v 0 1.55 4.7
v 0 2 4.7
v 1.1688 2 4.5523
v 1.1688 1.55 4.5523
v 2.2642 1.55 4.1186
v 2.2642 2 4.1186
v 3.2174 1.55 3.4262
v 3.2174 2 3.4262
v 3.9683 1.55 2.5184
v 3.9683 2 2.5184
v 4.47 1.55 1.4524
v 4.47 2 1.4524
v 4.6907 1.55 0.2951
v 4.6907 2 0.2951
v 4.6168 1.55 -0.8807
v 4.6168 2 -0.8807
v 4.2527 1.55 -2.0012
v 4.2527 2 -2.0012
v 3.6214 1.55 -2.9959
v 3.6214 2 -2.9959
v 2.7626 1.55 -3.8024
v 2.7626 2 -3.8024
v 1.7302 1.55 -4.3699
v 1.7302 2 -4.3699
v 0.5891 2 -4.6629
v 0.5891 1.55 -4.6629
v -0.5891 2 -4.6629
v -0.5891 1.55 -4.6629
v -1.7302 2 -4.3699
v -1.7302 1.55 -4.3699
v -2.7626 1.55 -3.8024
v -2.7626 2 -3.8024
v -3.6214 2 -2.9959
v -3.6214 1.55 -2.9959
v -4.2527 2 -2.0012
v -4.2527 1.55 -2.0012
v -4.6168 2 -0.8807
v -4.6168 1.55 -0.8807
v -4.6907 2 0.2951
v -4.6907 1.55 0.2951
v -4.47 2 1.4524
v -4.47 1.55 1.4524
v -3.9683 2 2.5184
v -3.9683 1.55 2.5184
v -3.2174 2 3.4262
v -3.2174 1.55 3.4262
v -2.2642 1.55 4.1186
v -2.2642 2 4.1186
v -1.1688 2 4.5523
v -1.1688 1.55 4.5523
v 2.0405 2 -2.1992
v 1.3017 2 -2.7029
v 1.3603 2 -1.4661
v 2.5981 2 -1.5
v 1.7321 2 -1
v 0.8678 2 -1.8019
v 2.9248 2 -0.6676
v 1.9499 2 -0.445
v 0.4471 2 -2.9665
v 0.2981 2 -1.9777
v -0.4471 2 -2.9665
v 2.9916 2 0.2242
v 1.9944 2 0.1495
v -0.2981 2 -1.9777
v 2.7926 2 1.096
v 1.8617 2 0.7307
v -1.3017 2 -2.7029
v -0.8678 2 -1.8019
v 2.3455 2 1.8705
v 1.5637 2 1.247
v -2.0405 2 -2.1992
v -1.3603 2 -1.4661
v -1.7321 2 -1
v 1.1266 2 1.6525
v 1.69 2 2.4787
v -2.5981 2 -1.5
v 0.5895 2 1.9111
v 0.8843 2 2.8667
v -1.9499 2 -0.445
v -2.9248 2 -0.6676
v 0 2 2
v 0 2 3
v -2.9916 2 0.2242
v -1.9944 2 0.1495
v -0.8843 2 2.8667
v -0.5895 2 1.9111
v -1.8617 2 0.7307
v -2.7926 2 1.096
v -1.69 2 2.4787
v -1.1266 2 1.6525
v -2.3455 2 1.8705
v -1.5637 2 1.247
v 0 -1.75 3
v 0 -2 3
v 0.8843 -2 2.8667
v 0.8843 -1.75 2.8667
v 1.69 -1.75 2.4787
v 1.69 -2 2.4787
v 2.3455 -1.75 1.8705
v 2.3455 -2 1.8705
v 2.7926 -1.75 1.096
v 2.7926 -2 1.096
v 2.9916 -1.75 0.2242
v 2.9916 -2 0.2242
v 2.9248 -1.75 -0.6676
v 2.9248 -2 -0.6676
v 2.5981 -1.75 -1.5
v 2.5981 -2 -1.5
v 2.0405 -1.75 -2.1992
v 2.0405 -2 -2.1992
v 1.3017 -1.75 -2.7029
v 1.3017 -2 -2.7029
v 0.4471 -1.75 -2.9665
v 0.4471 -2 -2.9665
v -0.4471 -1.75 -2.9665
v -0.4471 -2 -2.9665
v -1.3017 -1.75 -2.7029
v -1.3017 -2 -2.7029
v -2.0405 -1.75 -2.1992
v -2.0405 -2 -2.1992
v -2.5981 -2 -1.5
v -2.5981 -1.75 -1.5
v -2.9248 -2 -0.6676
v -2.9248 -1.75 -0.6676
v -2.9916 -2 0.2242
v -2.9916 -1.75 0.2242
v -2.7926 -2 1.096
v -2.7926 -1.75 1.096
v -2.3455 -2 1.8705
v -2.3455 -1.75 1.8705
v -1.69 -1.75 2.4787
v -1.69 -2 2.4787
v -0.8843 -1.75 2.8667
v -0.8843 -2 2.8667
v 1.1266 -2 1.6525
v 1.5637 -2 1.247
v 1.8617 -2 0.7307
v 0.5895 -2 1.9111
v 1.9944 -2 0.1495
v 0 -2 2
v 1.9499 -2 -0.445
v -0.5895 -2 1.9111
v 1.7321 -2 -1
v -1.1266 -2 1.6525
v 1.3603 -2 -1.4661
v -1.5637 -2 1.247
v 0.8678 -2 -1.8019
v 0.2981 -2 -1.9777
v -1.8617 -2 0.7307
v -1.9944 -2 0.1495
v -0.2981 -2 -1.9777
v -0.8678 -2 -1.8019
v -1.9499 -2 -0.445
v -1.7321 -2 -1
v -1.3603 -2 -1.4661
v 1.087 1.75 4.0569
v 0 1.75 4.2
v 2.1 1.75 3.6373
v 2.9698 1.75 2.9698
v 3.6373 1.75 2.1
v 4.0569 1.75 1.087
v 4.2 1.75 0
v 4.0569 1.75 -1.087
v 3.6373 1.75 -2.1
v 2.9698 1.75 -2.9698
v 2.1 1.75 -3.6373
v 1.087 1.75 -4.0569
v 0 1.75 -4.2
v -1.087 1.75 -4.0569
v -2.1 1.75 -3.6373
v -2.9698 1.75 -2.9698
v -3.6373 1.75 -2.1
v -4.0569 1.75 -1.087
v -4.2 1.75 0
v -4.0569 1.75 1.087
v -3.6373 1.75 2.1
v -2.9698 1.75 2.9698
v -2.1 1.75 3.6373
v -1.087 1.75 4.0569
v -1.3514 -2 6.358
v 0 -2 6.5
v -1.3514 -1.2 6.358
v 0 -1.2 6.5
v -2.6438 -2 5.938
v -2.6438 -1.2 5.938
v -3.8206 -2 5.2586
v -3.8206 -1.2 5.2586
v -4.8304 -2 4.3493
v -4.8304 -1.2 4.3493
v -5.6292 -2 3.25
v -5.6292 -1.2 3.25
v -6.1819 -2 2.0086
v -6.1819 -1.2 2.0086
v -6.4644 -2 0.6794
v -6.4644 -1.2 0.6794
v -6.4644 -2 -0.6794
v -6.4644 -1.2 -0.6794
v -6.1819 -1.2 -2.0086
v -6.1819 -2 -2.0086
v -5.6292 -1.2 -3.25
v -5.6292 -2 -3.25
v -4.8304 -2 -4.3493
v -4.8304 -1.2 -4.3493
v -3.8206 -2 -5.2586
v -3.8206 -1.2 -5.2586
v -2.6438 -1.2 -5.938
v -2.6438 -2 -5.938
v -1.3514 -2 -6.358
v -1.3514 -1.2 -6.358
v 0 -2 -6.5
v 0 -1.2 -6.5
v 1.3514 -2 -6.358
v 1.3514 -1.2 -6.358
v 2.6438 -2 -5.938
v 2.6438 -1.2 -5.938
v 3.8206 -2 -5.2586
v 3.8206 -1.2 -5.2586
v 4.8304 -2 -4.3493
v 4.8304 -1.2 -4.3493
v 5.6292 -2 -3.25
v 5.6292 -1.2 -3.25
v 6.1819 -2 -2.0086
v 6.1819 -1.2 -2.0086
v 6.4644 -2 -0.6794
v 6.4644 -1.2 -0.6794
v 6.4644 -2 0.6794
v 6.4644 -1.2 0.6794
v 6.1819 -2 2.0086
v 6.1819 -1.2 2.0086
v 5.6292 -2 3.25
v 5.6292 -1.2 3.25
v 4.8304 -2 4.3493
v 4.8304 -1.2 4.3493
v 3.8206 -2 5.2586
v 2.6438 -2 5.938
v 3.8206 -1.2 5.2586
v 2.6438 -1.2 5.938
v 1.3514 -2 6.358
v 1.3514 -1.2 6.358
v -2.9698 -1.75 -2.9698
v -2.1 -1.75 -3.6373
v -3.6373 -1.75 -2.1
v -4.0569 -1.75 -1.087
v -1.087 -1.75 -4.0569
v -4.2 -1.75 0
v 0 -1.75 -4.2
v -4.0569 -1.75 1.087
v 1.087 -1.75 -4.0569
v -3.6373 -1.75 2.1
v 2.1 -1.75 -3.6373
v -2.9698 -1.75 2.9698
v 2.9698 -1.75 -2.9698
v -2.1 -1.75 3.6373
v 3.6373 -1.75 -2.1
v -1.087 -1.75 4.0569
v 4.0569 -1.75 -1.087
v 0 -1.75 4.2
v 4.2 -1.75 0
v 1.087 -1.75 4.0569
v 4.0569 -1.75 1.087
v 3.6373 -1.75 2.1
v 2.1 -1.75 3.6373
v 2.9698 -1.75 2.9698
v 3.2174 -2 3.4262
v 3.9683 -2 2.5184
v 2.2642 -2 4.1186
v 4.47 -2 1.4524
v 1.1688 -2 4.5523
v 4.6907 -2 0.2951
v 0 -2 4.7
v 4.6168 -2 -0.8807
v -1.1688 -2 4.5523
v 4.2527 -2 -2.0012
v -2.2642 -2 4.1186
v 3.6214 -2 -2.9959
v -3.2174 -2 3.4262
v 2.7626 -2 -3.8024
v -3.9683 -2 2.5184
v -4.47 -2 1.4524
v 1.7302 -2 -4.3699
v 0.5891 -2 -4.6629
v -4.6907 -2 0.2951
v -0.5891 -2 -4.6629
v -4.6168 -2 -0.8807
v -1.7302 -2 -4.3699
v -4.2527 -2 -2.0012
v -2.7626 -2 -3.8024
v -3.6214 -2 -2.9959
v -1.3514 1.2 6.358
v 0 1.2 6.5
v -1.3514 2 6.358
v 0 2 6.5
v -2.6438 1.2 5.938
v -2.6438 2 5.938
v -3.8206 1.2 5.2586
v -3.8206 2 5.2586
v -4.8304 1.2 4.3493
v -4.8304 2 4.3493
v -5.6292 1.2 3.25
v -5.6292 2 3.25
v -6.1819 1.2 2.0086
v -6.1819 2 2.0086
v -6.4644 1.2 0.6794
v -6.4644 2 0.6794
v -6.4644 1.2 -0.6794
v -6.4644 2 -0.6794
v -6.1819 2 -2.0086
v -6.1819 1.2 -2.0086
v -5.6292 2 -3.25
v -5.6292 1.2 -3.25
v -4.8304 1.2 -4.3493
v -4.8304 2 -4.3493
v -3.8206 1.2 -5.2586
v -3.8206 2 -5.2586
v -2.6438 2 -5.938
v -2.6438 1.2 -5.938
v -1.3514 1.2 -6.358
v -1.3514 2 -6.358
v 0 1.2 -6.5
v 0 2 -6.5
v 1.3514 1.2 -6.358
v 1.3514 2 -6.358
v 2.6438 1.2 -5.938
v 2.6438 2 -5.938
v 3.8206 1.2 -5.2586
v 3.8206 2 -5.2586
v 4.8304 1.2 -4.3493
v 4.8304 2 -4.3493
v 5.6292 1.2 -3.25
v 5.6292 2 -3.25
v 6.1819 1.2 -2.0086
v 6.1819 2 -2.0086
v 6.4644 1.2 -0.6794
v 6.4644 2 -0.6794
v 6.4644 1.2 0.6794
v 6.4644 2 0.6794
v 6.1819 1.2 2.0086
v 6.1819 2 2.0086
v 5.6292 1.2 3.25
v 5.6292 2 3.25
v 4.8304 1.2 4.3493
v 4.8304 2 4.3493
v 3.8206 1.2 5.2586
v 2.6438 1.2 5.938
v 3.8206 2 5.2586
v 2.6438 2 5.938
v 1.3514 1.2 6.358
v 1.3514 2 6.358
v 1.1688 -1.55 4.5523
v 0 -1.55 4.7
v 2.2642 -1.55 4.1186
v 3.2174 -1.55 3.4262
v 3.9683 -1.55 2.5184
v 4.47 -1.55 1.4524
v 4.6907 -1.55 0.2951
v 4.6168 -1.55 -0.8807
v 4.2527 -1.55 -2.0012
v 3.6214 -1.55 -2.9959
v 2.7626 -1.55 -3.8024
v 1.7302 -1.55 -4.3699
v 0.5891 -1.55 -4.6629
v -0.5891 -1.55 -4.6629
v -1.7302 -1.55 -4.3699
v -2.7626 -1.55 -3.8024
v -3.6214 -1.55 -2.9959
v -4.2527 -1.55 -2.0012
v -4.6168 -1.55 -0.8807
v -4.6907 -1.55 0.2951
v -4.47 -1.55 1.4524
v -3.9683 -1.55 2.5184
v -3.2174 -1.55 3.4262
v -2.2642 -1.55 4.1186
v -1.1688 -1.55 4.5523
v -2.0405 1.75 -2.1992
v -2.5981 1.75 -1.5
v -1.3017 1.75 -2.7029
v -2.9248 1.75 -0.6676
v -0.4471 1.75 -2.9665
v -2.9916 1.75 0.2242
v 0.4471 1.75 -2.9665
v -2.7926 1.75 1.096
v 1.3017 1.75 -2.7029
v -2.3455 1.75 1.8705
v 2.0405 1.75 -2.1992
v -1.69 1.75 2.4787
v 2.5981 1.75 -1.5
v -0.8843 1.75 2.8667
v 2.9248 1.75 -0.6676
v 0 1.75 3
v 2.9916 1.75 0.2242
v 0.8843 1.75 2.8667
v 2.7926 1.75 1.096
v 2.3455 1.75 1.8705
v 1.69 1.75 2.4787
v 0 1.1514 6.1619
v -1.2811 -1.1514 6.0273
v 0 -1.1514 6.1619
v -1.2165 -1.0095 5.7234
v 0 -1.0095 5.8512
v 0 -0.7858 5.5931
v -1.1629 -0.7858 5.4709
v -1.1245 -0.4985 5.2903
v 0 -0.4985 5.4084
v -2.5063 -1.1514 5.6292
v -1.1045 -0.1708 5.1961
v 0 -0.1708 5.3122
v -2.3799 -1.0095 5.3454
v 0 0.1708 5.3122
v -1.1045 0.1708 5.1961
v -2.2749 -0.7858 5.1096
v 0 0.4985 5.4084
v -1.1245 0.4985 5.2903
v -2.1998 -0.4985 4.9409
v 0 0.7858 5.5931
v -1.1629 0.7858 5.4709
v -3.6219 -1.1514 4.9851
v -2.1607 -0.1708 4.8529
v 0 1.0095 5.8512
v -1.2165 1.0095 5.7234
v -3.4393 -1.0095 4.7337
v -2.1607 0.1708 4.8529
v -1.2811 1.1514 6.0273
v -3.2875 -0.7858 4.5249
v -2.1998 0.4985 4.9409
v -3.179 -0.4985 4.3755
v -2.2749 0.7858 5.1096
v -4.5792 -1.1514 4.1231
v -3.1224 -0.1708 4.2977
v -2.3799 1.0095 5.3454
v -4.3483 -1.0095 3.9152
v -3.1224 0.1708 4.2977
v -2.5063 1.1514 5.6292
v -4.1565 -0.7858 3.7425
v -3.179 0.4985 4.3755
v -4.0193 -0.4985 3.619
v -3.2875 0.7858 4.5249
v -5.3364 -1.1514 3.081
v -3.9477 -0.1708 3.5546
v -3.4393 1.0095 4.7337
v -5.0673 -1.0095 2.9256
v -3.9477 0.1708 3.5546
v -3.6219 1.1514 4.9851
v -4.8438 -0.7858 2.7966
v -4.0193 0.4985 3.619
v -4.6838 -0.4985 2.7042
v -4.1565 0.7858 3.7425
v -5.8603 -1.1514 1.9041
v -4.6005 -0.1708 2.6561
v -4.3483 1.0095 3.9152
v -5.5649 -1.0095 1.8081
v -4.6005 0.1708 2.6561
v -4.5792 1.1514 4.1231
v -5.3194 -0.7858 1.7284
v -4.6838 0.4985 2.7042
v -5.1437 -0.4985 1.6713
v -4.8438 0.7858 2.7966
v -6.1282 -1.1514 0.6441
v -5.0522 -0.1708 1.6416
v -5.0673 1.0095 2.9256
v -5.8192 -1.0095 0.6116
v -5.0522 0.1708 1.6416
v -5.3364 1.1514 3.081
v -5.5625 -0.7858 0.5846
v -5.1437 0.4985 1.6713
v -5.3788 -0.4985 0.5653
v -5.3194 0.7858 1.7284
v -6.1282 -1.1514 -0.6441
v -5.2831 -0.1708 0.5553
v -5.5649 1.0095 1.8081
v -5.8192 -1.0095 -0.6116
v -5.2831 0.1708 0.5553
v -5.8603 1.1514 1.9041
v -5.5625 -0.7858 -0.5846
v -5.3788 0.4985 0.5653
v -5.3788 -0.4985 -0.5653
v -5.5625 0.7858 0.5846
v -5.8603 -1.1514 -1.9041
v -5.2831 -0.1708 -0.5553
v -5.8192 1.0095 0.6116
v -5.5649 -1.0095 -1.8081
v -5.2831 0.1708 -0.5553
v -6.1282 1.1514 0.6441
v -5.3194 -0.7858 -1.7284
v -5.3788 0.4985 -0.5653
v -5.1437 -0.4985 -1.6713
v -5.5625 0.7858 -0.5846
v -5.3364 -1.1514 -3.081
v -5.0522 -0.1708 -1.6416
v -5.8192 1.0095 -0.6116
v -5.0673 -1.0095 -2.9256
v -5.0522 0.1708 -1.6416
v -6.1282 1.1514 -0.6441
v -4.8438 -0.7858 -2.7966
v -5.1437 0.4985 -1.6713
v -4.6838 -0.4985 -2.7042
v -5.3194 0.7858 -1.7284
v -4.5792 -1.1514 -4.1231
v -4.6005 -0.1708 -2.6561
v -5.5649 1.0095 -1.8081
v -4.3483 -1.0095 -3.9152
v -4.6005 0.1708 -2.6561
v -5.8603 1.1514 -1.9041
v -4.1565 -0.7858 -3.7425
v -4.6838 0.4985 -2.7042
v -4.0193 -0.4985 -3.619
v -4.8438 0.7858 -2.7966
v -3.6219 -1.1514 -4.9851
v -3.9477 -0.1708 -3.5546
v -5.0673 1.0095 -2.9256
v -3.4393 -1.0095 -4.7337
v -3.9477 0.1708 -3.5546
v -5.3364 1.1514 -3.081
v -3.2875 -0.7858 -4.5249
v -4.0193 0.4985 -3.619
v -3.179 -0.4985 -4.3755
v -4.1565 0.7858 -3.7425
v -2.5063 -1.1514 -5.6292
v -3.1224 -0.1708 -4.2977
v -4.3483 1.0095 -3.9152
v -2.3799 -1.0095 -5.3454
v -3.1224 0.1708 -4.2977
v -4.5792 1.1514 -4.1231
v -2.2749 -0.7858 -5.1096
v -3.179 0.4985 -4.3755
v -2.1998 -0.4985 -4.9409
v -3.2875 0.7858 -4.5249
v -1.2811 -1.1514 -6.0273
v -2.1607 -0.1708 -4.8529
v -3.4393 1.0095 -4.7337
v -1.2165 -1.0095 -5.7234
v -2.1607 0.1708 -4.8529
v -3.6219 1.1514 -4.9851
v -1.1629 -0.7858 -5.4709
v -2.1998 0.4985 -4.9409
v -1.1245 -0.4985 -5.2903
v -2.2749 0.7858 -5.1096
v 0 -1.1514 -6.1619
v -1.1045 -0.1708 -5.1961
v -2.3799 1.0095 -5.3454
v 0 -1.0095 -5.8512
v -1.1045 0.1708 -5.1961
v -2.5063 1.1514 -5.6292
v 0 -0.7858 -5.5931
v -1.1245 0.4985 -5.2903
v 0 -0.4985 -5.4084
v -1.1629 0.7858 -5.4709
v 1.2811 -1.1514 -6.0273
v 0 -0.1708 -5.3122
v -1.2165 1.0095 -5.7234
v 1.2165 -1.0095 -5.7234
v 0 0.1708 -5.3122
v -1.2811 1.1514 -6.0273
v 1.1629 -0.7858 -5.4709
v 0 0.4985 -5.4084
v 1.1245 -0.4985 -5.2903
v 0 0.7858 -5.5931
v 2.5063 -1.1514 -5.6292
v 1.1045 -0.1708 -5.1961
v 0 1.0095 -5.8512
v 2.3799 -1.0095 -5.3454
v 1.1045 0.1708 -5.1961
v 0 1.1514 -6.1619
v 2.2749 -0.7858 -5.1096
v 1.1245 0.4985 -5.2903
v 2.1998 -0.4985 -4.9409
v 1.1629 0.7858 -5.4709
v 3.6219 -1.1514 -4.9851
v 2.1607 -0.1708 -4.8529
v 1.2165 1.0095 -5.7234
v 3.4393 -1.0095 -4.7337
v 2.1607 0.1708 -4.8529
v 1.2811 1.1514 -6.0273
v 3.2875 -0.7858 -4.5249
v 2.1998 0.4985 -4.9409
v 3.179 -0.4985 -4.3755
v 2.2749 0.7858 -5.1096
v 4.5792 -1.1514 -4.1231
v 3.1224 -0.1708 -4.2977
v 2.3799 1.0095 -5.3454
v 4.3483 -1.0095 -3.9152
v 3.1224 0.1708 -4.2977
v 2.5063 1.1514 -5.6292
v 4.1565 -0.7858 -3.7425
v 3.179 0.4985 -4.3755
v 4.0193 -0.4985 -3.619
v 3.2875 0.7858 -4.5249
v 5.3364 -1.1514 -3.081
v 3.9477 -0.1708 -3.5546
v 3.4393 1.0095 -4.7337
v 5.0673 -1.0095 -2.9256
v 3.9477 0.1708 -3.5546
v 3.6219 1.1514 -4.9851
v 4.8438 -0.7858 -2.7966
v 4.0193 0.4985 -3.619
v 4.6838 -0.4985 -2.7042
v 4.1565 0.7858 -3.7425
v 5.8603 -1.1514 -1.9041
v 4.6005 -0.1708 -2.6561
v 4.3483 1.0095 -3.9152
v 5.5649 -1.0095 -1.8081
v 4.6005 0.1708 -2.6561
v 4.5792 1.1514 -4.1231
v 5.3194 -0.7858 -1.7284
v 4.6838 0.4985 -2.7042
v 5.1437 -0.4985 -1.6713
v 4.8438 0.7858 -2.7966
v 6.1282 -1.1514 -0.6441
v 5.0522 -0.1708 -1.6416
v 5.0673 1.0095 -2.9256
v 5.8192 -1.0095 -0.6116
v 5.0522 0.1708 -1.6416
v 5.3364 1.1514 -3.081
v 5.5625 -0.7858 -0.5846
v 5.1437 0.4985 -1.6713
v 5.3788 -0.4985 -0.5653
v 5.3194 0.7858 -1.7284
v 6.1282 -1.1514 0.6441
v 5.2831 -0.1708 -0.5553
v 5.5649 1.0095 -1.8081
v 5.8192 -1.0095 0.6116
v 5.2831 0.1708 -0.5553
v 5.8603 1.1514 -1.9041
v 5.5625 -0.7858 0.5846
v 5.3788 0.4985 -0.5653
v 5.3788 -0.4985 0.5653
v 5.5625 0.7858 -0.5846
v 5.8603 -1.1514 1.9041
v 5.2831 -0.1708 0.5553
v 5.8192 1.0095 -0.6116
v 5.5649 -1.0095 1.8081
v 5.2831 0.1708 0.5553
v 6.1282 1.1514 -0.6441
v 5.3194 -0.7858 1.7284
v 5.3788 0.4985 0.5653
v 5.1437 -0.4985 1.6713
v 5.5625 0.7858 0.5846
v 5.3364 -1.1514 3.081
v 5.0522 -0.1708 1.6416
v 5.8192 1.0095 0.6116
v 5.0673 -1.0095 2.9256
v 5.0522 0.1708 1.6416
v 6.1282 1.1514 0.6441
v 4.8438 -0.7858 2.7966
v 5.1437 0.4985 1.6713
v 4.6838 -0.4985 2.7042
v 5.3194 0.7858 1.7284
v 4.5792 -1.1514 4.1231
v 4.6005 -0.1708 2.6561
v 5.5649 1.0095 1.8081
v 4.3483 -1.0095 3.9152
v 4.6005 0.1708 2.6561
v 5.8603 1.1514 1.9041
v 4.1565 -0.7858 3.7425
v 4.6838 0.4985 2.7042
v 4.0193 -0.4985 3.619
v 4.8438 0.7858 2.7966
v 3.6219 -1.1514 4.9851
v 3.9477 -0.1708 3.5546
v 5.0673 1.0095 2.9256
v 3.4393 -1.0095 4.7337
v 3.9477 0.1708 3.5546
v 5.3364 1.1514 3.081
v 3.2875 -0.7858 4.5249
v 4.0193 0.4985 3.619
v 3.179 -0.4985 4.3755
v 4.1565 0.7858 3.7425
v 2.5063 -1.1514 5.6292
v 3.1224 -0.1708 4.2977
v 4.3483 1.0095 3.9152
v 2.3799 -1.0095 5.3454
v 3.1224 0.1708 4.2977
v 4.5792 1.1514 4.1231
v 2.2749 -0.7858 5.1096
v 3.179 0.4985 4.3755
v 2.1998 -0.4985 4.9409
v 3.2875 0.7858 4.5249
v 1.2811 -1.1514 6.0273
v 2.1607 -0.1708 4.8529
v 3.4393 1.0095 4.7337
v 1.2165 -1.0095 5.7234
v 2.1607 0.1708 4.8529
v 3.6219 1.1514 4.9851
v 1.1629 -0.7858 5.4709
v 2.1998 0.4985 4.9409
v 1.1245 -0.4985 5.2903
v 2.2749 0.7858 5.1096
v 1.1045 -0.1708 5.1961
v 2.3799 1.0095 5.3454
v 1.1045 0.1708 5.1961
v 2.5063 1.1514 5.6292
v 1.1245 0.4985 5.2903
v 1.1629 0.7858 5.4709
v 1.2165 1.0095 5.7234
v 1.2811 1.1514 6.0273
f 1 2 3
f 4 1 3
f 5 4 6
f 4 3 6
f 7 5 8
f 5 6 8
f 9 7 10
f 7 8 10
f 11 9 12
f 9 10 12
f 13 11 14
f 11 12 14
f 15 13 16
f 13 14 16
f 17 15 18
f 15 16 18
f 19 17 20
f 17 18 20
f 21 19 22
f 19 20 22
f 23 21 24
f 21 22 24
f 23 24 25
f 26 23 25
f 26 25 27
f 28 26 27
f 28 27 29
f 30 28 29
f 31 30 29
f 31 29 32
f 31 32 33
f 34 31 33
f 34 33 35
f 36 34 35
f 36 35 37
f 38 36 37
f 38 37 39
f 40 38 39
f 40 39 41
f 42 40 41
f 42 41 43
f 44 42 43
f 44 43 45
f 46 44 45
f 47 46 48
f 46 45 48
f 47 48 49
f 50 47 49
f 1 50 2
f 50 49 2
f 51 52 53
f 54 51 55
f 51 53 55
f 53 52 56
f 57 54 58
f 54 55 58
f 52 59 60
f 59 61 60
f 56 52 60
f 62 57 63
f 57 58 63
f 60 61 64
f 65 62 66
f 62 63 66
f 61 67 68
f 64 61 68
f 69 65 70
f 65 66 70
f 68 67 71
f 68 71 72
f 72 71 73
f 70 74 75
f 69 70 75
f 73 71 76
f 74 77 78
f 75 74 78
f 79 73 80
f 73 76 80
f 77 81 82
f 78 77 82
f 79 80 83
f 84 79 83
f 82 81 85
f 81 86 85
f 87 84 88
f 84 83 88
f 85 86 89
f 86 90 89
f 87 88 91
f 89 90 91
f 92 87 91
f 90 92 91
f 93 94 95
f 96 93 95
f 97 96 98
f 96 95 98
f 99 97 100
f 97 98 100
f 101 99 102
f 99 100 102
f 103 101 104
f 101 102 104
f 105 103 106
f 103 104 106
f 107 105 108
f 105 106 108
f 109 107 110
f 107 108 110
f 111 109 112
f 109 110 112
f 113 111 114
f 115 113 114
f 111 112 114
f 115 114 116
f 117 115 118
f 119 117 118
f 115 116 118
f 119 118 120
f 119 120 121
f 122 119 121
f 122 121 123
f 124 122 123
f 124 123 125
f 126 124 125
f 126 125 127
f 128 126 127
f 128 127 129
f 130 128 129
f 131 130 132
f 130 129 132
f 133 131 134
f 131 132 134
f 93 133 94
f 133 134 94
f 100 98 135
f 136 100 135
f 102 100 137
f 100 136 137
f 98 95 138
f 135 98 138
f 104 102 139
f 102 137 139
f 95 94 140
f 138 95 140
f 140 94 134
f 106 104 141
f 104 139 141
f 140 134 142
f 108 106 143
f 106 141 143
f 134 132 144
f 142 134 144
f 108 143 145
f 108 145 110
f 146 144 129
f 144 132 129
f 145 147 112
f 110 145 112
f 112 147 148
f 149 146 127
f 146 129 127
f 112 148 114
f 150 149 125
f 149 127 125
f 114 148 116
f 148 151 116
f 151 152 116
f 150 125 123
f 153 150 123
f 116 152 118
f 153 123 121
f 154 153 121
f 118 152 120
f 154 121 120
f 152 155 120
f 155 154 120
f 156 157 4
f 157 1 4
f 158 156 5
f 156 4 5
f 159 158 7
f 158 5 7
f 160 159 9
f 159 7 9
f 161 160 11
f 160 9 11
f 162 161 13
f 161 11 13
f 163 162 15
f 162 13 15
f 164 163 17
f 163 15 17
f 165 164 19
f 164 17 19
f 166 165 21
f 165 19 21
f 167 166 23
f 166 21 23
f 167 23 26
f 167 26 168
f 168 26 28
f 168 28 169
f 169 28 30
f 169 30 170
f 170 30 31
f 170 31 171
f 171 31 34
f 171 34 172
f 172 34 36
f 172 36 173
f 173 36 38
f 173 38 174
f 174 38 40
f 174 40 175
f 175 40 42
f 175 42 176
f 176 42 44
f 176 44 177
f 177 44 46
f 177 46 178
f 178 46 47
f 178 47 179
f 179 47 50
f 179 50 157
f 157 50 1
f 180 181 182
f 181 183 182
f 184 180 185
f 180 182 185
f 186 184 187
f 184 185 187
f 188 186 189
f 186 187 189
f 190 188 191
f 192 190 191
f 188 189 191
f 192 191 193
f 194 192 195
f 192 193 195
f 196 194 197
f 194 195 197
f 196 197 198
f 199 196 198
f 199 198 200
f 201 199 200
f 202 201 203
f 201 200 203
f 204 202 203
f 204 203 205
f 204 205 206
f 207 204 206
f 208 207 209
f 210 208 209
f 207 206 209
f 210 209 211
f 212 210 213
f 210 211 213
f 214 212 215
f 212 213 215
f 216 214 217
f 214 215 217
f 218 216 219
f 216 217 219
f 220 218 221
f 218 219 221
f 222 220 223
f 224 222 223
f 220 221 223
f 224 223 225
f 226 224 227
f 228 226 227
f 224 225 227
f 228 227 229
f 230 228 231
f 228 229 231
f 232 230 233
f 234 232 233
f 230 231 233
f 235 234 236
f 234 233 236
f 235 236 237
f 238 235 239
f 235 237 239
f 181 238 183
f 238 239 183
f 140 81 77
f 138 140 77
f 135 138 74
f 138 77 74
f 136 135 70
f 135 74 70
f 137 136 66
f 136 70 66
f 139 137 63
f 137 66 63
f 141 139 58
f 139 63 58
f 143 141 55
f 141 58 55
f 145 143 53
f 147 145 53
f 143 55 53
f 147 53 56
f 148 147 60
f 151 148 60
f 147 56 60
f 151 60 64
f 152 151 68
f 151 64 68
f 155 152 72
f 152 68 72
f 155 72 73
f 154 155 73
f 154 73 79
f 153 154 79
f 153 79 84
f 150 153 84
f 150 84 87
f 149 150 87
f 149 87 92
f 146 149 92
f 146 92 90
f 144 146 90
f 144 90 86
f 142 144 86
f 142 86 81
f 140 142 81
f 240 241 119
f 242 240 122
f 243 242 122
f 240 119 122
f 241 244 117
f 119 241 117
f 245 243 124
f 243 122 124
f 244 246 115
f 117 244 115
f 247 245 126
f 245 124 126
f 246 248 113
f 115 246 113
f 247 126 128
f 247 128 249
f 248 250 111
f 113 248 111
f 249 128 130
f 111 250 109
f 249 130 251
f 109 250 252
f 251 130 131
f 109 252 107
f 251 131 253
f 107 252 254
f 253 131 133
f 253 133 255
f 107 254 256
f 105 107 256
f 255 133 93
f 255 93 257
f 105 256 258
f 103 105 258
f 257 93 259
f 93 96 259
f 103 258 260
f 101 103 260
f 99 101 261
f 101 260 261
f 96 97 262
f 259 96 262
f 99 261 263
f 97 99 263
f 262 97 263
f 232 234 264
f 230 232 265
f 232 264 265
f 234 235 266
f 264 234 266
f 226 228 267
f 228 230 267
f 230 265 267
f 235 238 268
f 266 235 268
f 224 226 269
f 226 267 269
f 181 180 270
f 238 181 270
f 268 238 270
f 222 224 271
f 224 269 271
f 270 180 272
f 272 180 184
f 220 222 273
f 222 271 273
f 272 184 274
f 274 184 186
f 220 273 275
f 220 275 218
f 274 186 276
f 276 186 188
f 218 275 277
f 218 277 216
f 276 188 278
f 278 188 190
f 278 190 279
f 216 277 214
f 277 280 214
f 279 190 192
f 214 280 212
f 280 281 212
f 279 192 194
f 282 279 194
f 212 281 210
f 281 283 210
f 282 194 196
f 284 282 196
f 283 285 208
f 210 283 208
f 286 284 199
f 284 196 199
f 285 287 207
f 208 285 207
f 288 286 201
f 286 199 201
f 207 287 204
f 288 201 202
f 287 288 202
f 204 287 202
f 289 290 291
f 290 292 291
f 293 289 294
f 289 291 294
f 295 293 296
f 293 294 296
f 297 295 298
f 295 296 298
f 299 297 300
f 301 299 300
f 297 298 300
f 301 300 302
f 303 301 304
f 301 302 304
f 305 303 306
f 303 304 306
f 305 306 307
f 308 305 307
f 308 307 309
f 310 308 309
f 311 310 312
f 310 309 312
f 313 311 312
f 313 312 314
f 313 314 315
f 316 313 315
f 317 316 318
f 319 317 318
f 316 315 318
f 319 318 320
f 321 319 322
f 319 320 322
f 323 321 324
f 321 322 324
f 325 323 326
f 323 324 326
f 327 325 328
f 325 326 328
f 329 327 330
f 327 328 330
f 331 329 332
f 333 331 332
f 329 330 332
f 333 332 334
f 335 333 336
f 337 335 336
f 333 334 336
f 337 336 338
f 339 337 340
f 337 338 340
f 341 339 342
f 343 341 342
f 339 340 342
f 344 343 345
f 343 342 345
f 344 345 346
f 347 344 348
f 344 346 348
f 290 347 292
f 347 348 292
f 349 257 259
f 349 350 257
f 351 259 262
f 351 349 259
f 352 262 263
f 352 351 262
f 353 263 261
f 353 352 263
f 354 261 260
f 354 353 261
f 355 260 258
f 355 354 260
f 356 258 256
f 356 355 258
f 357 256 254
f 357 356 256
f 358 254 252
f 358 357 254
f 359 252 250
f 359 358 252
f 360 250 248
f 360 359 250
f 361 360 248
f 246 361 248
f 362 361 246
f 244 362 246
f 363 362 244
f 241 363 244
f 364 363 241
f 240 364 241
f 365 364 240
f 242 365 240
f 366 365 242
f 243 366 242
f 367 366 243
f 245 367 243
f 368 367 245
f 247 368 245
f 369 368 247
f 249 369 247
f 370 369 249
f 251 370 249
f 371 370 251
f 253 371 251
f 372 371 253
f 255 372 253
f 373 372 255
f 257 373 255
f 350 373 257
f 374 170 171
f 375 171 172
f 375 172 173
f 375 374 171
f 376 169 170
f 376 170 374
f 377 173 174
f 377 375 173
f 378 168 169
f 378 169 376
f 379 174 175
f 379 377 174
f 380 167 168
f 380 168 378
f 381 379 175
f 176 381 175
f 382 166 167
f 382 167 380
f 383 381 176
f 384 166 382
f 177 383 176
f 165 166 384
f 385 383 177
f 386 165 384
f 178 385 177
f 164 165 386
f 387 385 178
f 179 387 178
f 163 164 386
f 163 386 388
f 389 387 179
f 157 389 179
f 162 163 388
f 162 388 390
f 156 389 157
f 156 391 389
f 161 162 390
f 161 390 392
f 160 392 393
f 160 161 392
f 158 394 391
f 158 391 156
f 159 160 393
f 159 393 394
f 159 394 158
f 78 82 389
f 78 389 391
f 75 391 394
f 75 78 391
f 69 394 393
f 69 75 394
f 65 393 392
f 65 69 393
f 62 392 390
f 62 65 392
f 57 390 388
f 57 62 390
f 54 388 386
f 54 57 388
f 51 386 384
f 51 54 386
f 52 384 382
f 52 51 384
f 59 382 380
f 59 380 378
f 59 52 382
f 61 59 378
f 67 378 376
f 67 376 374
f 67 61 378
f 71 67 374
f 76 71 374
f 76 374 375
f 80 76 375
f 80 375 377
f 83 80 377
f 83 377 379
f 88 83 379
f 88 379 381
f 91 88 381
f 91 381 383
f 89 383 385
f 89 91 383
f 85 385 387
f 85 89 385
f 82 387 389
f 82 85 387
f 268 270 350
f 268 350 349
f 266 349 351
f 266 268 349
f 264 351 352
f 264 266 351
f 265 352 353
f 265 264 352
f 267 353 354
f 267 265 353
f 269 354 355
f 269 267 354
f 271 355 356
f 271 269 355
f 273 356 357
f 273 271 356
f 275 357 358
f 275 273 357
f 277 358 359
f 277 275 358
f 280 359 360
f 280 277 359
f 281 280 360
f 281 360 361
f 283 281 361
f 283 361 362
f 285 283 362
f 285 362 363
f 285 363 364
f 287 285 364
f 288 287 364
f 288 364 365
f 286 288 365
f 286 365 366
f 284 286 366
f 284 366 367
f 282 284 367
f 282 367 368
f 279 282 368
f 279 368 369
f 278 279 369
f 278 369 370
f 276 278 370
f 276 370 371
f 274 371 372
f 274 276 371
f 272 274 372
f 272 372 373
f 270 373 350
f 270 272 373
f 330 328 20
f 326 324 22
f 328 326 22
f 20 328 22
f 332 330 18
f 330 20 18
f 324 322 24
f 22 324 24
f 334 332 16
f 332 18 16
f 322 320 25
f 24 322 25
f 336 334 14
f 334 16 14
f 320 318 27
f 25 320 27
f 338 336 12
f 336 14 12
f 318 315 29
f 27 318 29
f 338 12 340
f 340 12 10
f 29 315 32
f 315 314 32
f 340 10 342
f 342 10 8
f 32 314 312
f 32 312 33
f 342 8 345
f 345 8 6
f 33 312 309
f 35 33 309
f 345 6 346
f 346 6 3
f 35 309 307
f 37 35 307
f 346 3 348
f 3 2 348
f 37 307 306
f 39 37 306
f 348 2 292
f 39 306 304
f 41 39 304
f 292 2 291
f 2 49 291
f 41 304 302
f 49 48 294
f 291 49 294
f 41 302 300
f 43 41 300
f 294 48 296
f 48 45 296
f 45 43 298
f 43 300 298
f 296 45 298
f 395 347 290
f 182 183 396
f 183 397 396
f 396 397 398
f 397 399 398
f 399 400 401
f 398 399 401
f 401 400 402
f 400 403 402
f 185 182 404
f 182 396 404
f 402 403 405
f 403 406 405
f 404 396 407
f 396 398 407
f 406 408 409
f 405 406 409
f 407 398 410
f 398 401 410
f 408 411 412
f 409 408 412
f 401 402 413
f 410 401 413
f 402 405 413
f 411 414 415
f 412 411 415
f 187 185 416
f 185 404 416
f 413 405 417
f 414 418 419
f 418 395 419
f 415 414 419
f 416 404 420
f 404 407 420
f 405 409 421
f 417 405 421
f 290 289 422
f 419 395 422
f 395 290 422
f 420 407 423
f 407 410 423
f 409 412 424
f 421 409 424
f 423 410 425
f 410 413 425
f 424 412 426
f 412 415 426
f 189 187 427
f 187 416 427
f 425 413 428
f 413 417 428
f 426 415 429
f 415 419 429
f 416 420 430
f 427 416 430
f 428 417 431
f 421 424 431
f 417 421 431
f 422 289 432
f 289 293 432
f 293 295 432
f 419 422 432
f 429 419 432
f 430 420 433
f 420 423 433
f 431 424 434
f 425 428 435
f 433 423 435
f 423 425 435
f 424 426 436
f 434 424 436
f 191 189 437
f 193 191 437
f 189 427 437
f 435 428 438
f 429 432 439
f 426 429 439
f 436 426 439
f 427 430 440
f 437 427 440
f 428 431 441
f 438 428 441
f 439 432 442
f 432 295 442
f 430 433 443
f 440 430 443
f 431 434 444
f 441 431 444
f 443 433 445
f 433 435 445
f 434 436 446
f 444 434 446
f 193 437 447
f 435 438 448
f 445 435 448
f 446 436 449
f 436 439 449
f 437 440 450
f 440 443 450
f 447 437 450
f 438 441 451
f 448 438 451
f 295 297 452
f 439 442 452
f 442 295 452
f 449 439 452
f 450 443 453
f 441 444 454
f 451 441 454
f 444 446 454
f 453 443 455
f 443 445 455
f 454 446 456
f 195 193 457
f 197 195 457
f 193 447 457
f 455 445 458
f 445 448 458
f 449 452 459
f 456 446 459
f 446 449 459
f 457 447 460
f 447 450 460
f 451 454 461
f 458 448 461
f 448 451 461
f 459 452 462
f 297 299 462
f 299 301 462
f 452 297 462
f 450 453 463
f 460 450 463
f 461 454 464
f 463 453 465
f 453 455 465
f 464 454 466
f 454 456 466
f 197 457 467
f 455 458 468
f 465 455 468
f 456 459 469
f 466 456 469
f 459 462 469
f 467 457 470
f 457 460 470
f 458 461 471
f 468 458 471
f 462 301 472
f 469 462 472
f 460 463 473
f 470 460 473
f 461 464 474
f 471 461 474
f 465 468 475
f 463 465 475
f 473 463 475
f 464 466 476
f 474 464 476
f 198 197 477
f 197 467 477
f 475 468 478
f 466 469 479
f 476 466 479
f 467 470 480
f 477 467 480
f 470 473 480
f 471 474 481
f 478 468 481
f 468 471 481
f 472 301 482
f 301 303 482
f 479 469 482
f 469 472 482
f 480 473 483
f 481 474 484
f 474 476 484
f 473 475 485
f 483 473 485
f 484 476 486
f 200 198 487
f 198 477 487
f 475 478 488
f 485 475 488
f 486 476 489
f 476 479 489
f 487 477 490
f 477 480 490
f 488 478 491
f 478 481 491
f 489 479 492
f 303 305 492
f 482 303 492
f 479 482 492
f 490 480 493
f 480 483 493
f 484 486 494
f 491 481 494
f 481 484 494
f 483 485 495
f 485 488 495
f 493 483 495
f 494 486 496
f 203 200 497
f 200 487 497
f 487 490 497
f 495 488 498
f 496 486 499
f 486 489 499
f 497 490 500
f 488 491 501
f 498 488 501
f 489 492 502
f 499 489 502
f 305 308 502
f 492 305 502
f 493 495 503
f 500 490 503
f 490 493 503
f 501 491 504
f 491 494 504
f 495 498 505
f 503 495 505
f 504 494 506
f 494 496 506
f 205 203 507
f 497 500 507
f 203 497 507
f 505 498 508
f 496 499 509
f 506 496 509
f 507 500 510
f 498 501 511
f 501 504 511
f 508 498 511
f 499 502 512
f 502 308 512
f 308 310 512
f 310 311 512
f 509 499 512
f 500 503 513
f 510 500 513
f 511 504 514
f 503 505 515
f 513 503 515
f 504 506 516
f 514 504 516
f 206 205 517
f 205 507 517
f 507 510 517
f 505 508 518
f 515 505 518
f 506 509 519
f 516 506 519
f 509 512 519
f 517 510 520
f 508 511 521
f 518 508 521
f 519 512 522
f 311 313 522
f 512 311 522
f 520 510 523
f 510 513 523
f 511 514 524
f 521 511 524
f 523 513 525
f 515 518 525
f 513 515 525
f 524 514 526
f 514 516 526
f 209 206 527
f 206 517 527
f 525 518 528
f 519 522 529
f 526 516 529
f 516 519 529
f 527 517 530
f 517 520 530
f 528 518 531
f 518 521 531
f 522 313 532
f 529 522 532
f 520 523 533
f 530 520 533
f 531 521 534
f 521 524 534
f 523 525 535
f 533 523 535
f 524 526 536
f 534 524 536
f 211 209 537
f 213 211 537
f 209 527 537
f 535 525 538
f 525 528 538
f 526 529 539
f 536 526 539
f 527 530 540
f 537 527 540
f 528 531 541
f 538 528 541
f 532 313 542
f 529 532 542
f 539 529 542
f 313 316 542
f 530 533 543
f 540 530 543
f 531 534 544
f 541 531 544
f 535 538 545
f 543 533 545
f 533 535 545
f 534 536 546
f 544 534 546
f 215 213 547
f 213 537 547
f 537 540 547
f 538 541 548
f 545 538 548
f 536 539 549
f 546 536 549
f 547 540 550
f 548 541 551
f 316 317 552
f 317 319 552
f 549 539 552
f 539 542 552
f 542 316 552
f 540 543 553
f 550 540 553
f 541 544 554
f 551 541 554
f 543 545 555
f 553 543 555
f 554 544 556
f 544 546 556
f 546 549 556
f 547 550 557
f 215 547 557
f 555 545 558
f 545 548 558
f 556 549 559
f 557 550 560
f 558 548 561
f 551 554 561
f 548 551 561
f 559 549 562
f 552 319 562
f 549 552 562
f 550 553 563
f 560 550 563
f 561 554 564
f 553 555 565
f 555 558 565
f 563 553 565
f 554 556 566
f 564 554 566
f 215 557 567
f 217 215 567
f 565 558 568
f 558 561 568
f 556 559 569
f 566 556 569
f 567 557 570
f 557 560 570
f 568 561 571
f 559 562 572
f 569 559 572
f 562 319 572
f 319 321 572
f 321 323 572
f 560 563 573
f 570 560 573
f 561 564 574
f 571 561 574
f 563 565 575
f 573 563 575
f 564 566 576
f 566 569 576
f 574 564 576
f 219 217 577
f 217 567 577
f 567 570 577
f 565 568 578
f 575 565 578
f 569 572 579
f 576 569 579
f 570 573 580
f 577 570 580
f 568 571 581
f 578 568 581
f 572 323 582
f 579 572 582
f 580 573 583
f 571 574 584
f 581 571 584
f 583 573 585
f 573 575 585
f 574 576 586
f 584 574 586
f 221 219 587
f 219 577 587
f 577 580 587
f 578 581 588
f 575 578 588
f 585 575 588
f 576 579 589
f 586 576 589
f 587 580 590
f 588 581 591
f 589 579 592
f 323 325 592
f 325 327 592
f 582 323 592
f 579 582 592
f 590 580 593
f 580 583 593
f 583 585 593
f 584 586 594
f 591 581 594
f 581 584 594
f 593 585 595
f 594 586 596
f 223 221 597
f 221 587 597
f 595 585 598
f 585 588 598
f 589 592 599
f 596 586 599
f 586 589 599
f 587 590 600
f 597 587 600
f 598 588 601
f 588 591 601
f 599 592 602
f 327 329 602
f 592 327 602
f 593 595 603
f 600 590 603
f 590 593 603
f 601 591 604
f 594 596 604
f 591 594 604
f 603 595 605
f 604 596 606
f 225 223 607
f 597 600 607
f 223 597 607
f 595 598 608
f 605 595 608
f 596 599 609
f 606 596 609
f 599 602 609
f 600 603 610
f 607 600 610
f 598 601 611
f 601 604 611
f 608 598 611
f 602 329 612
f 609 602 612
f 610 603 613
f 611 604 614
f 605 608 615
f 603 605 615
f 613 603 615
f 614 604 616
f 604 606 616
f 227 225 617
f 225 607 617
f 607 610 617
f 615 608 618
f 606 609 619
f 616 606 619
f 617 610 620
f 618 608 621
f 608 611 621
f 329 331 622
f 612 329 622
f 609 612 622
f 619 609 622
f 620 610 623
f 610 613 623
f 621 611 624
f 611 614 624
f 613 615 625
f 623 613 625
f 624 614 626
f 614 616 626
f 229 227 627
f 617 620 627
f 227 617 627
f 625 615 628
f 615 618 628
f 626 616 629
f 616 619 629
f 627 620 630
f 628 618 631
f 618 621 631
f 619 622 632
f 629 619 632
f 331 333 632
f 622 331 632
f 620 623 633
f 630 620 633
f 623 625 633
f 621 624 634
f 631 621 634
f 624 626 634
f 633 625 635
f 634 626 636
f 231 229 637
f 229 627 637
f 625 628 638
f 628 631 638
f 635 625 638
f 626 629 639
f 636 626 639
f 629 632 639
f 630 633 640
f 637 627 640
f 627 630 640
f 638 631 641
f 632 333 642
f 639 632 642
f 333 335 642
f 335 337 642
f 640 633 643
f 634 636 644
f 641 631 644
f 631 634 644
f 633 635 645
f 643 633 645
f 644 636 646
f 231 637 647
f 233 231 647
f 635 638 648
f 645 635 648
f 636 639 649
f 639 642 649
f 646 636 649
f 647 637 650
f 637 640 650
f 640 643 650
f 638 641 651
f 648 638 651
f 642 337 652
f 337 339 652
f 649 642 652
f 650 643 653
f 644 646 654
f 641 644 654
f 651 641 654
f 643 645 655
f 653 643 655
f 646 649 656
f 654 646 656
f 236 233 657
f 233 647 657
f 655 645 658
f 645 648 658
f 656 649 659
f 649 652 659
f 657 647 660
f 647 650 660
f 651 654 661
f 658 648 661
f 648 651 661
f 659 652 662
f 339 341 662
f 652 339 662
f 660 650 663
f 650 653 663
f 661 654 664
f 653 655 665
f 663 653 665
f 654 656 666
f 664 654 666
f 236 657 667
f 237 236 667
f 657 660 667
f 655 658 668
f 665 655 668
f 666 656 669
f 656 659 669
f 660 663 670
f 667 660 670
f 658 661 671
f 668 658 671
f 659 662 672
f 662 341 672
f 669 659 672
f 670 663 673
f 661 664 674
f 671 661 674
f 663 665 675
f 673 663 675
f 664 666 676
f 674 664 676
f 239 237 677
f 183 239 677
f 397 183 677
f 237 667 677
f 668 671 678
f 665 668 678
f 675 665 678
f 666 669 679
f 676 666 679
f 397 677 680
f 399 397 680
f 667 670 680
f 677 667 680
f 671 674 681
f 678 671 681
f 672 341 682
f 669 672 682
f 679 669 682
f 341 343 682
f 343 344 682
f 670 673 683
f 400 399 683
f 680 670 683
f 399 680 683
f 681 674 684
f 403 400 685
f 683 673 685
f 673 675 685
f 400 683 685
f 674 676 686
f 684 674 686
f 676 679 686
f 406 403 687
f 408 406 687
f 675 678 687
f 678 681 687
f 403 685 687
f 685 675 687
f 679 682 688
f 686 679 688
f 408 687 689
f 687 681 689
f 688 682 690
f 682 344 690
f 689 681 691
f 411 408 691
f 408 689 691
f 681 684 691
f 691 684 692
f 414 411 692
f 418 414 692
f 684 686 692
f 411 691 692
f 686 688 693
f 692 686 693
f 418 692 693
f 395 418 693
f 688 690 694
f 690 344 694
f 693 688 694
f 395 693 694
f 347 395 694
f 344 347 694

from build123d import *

# Parameters (mm, degrees)
SKETCH2_R          = 2
CUT_EXTRUDE1_DEPTH = 11.024968828
SKETCH3_R          = 4.7
SKETCH3_R_2        = 3
CUT_EXTRUDE2_DEPTH = 0.25


with BuildPart() as part:
    # Sketch1 → Revolve1 (revolve)
    with BuildSketch(Plane.XY, mode=Mode.PRIVATE) as revolve1_sk:
        with BuildLine():
            Line((0, 2), (0, -2))
            Line((0, -2), (6.5, -2))
            Line((6.5, -2), (6.5, -1.2))
            ThreePointArc((6.5, -1.2), (5.3, 0), (6.5, 1.2))
            Line((6.5, 1.2), (6.5, 2))
            Line((6.5, 2), (0, 2))
        make_face()
    revolve(revolve1_sk.sketch.rotate(Axis((0, 2, 0), (0, -1, 0)), 90), axis=Axis((0, 2, 0), (0, -1, 0)))

    # Sketch2 → Cut-Extrude1 (cut, through all)
    with BuildSketch(Plane(origin=(0, 2, 0), x_dir=(1, 0, 0), z_dir=(0, 1, 0))):
        with Locations(Location((0, 0, 0), (0, 0, 270))):
            Circle(SKETCH2_R)
    extrude(amount=-CUT_EXTRUDE1_DEPTH, mode=Mode.SUBTRACT)

    # Sketch3 → Cut-Extrude2 (cut)
    with BuildSketch(Plane(origin=(0, 2, 0), x_dir=(1, 0, 0), z_dir=(0, 1, 0))):
        with Locations(Location((0, 0, 0), (0, 0, 270))):
            Circle(SKETCH3_R)
        with Locations(Location((0, 0, 0), (0, 0, 270))):
            Circle(SKETCH3_R_2, mode=Mode.SUBTRACT)
    cut_extrude2 = extrude(amount=-CUT_EXTRUDE2_DEPTH, mode=Mode.SUBTRACT)

    # Sketch4 → Cut-Revolve1 (revolve, cut)
    with BuildSketch(Plane.XY, mode=Mode.PRIVATE) as cut_revolve1_sk:
        Polygon((4.7, 1.75), (4.2, 1.75), (4.7, 1.55), align=None)
    cut_revolve1 = revolve(cut_revolve1_sk.sketch.rotate(Axis((0, 1.75, 0), (0, 1, 0)), 270), axis=Axis((0, 1.75, 0), (0, 1, 0)), mode=Mode.SUBTRACT)

    # Mirror1: Cut-Extrude2, Cut-Revolve1 across plane
    add(cut_extrude2.mirror(Plane.ZX), mode=Mode.SUBTRACT)
    add(cut_revolve1.mirror(Plane.ZX), mode=Mode.SUBTRACT)


solid = part.part
